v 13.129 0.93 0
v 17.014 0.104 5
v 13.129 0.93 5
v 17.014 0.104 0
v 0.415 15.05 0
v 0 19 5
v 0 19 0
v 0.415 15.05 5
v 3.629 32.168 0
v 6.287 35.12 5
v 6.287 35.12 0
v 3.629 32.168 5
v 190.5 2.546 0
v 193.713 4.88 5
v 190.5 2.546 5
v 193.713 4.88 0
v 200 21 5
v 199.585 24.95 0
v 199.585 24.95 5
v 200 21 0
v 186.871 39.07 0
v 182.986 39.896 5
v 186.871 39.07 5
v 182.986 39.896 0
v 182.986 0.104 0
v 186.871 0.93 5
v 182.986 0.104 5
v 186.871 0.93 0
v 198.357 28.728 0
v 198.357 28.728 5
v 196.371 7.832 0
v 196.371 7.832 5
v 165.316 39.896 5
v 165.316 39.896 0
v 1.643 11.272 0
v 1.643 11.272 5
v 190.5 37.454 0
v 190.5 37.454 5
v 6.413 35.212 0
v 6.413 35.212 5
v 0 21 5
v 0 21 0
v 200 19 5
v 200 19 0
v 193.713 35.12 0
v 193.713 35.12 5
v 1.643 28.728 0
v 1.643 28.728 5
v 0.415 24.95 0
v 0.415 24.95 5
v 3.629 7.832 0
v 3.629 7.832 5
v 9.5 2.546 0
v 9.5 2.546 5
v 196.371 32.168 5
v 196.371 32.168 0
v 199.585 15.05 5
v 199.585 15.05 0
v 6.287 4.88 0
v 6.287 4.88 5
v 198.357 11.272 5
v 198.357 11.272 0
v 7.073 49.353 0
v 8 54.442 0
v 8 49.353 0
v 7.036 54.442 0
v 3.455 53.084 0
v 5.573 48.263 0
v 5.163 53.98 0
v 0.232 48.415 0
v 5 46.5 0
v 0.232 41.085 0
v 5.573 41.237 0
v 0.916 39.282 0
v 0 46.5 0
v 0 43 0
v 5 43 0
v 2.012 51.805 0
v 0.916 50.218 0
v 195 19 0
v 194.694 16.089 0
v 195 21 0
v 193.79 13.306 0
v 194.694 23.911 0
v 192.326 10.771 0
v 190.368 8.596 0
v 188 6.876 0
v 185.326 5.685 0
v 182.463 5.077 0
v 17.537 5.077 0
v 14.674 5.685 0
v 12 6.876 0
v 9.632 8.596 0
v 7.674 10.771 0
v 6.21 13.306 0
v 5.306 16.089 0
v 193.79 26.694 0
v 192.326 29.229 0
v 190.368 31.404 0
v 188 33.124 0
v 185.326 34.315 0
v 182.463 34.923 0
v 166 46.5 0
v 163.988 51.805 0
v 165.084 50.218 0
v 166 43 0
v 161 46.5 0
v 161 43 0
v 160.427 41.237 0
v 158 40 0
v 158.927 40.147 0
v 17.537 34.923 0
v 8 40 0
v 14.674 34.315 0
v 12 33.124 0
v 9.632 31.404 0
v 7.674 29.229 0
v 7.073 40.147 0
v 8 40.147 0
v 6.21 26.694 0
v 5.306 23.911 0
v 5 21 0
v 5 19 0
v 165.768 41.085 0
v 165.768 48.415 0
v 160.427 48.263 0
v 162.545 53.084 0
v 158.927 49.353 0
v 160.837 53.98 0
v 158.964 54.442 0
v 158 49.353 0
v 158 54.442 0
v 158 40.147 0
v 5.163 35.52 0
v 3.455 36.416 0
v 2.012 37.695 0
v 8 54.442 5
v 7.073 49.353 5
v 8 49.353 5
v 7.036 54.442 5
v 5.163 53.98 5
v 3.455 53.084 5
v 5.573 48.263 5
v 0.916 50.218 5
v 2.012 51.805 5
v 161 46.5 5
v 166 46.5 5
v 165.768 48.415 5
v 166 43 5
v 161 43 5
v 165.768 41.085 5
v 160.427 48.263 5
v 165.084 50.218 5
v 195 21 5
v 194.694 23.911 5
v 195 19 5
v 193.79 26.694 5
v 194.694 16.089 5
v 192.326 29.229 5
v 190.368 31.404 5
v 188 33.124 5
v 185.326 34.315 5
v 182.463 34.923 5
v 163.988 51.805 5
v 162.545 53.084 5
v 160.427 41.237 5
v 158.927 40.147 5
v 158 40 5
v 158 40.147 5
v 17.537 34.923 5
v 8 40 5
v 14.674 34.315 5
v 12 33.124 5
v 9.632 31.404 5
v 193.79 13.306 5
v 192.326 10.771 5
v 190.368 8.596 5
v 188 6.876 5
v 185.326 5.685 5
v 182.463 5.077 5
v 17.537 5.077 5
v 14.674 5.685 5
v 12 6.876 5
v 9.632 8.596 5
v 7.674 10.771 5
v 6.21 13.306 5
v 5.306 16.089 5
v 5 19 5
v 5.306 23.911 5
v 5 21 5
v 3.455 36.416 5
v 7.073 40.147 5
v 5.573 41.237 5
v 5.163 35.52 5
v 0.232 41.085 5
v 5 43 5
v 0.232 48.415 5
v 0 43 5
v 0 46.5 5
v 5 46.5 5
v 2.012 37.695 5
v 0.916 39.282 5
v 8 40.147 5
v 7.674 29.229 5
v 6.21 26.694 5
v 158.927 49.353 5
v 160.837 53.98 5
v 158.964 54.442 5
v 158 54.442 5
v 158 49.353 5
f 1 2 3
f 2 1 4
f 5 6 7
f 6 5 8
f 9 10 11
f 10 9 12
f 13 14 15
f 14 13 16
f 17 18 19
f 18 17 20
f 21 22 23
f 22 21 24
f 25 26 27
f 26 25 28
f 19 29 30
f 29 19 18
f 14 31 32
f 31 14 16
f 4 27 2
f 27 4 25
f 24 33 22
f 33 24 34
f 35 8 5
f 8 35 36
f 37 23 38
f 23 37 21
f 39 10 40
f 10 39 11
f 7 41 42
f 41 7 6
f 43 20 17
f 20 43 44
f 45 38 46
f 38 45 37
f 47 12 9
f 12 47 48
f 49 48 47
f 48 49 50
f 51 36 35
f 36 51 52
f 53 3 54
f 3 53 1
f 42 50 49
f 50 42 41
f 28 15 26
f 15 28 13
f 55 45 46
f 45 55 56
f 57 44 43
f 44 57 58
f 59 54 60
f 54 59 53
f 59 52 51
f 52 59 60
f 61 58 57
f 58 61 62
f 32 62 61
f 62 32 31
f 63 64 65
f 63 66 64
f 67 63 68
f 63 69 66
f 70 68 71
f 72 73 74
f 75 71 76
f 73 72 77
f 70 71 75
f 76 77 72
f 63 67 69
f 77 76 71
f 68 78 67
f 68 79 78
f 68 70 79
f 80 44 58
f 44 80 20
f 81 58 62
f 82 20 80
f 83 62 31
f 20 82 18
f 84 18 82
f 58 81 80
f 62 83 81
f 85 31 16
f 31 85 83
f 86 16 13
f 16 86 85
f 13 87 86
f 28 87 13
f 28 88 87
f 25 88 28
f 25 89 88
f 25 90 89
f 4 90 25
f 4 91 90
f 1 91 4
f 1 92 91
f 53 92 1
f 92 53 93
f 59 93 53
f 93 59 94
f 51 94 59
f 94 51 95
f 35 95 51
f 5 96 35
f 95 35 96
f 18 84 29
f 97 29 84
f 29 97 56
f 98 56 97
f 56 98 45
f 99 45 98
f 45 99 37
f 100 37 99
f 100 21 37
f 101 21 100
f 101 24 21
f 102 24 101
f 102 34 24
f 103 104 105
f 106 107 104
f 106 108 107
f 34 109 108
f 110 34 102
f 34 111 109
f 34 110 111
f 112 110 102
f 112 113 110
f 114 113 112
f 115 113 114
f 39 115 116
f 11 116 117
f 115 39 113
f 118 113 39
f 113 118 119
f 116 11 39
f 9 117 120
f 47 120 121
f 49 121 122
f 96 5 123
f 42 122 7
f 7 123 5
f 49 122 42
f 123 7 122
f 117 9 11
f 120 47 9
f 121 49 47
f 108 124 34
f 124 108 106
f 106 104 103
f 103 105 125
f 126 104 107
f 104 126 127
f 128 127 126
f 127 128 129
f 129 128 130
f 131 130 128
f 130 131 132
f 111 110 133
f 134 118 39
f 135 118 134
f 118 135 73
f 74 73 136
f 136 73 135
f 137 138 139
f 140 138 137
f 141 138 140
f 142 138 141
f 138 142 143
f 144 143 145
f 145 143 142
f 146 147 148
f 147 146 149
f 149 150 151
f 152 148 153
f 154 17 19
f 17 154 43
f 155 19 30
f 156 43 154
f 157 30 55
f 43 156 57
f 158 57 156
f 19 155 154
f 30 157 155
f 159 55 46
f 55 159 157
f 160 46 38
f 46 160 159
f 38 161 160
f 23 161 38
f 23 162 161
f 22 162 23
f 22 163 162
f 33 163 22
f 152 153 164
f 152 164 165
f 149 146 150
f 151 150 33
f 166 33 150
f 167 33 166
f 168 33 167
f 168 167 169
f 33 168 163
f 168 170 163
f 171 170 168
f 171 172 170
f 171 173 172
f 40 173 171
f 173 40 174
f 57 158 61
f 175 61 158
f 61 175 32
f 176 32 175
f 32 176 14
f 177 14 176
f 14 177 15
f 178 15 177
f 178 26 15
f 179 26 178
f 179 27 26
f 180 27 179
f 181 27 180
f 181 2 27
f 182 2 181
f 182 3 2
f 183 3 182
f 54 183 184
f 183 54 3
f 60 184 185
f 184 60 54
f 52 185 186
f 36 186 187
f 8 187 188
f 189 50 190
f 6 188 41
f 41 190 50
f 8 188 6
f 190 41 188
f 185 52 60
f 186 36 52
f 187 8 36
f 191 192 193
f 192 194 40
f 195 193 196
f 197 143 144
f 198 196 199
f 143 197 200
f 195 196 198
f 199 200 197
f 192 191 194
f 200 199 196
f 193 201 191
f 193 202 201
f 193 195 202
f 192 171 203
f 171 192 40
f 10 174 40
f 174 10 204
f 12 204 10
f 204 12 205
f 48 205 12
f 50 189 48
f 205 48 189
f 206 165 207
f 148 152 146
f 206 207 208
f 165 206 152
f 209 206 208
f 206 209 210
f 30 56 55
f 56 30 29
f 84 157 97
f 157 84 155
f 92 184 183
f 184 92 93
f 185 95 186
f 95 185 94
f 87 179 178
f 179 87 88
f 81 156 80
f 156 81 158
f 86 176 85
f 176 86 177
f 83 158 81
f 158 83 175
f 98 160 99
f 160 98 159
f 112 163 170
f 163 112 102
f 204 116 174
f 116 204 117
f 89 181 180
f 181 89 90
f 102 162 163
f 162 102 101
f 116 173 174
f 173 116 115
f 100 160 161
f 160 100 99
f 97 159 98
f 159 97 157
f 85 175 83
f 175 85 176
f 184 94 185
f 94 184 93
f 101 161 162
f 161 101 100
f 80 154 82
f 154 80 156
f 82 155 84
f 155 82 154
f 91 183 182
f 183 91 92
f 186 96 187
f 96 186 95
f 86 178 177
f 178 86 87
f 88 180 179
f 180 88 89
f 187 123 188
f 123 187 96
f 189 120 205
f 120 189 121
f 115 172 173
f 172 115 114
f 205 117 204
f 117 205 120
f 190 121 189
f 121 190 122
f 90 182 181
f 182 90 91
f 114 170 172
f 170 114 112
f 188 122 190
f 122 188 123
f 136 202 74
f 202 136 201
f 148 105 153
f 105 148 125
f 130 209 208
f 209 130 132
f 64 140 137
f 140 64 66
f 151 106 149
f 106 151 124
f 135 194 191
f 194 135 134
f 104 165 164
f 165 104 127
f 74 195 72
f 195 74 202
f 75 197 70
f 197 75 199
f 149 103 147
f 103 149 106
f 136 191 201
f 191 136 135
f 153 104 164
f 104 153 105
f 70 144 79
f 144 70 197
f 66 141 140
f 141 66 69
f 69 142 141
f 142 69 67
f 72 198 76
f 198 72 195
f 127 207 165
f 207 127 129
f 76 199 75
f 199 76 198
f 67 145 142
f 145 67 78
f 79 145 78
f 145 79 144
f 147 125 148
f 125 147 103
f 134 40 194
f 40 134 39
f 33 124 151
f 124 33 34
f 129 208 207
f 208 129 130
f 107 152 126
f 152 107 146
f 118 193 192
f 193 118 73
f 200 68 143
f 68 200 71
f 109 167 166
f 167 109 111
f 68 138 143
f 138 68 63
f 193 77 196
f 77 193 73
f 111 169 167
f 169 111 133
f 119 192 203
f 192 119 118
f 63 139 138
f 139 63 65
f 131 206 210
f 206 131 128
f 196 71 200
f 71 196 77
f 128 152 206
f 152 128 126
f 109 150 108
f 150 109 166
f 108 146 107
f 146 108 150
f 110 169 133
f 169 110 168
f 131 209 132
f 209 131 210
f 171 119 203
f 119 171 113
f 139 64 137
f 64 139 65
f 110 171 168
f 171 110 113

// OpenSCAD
// file: lib_soft.scad
/** 
 * An OpenSCAD library for creating shapes with rounded edges
 *
 * @author Paul Generes <paul.generes@gmail.com>
 * @example soft_example.scad
 */
 
module soft_cube(size=[1, 1, 1], center=false, cr=1) {
	tr = [cr, cr, cr];

    translate(tr) {
        minkowski() {
            sphere(cr);
            cube([size[0]-2*cr, size[1]-2*cr, size[2]-2*cr], center);
        }
    }
}

module softxyz_cube(size=1, center=false, cr=[1, 1, 1]) {
	tr = cr;

    translate(tr) {
        minkowski() {
			scale(cr) {
				sphere(1);
			}
            cube([size[0]-2*cr[0], size[1]-2*cr[1], size[2]-2*cr[2]], center);
        }
    }
}

module softz_cube(size=1, center=false, cr=1) {
	tr = [cr, cr, 0];

    translate(tr) {
        minkowski() {
			cylinder(h=0.00001, r=cr);
			cube([size[0]-2*cr, size[1]-2*cr, size[2]-0.00001], center);
        }
    }
}
// main file
/// 76.2 x 11.1   Moto X Pure
/// 78.4 x 12.1   Moto X Pure with Cover
/// 155 x 9 Nexus 9

// Device Width
device_width = 155+1.0; // [1:200]

// Device Thickness
device_thickness = 9+0.5; // [1:50]

// Device Corner Radius
device_corner_radius = 3; // [0:10]

// Visor Thickness
visor_thickness = 30; // [1:50]

// Visor Height
visor_height = 190; // [1:300]

// Visor Corner Radius
visor_corner_radius = 14; // [0:10]

// Thickness
thickness = 5; // [1:10]

//$fn = 16;

include <lib_soft.scad>



// Visor
difference() {
	softz_cube([visor_height+2*thickness, visor_thickness+2*thickness, thickness], cr=visor_corner_radius+thickness);
	translate([thickness, thickness, 0]) {
		softz_cube([visor_height, visor_thickness, thickness], cr=visor_corner_radius);
	}
}


// Device
translate([0, thickness+visor_thickness, 0]) {
	difference() {
		softz_cube([device_width+2*thickness, device_thickness+2*thickness, thickness], cr=device_corner_radius+thickness);
		translate([thickness, thickness, 0]) {
			softz_cube([device_width, device_thickness, thickness], cr=device_corner_radius);
		}
		translate([thickness+device_corner_radius, thickness, 0]) {
			cube([device_width-2*device_corner_radius, device_thickness+thickness, thickness]);
		}
	}
}
